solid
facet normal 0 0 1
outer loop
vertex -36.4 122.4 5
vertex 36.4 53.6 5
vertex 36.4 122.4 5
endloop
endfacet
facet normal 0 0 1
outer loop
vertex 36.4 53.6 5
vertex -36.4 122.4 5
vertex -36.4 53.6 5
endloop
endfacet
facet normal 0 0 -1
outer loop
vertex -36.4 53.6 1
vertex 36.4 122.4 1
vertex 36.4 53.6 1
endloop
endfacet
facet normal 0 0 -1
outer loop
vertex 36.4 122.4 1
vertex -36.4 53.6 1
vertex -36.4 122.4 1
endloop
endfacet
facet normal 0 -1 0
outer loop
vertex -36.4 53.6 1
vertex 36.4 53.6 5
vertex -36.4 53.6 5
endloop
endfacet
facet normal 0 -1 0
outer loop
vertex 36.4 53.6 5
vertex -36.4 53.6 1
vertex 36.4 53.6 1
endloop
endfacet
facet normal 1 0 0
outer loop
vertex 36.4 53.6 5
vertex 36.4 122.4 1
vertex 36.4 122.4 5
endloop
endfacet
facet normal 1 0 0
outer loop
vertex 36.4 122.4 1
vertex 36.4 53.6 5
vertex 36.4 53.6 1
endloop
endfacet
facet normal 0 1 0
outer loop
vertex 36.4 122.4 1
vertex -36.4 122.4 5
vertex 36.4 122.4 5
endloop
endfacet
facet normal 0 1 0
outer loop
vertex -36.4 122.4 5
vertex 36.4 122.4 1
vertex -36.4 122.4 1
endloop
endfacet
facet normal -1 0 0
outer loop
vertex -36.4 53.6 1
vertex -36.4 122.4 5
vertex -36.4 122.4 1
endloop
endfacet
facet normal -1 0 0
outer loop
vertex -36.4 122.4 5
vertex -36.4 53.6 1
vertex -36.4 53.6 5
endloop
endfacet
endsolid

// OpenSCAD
// file: ../dimensions.scad
// dimensions.scad — single source of truth for all tray geometry constants.
//
// All values in millimetres unless otherwise noted.
// Sources:
//   - CD/DVD drive envelope: SFF-8551 (5.25" half-height) and laptop slim ODD (9.5 mm)
//   - CD disc geometry: ECMA-130
//   - MiniDisc cartridge: Sony MiniDisc specification (MD)
//   - Issues weyucou/minidisc-tray#1 (3D modeling format research) and
//     weyucou/minidisc-tray#2 (CD/DVD tray dimensions)


// ---------------------------------------------------------------------------
// CD/DVD drive envelope (target form factor)
// ---------------------------------------------------------------------------

// Primary target: 5.25" half-height (SFF-8551) drive body.
DRIVE_BODY_W = 146.1;   // outer width
DRIVE_BODY_H = 41.3;    // outer height
DRIVE_BODY_D = 170;     // outer depth (typical; range 170–203)

// Slim laptop ODD (9.5 mm) — secondary parametric variant.
SLIM_BODY_W = 128;
SLIM_BODY_H = 9.5;
SLIM_BODY_D = 127;


// ---------------------------------------------------------------------------
// CD tray envelope (the cavity the printed tray must fit into)
// ---------------------------------------------------------------------------

// Inner tray usable width — the lateral envelope between the tray side walls.
// Derived in #2: ~63 mm from spindle centre to each side wall.
TRAY_INNER_W = 126;

// Spindle-centre-to-front-bezel distance.
// Range observed across donor drives: 80–95 mm.
// Default = mid-range; UPDATE after physical measurement of the actual donor drive.
SPINDLE_TO_BEZEL = 88;

// CD program area (informational — used to validate spindle clearance).
// ECMA-130: program area lies between r=25 and r=58 mm.
CD_DISC_DIA = 120;
CD_CENTER_HOLE = 15;
CD_CLAMP_R_MIN = 26;
CD_CLAMP_R_MAX = 33;

// Inner tray usable depth — derived from spindle-to-bezel + CD radius + rear margin.
// Matches typical 5.25" half-height CD tray depth. Refine when donor drive measured.
TRAY_INNER_D = SPINDLE_TO_BEZEL + CD_DISC_DIA / 2 + 10;

// Spindle clearance hole radius — clears the CD spindle hub / clamp area.
// Sized at CD_CLAMP_R_MAX + 1 mm safety; also clears the MD internal disc edge.
SPINDLE_CLEARANCE_R = CD_CLAMP_R_MAX + 1;


// ---------------------------------------------------------------------------
// MiniDisc cartridge (the part the tray must position and shutter-actuate)
// ---------------------------------------------------------------------------

// Cartridge outer dimensions — Sony MD spec.
MD_W = 72;   // width  (along shutter slide axis)
MD_D = 68;   // depth  (perpendicular to shutter slide)
MD_H = 5;    // thickness

// Internal disc — used for spindle-clearance hole sizing and centring checks.
MD_DISC_DIA = 64;
MD_CENTER_HOLE = 11;


// ---------------------------------------------------------------------------
// Print and fit tolerances
// ---------------------------------------------------------------------------

// Per-side print clearance applied to mating surfaces (tray-to-cavity, MD pocket).
// Tuned for AFINIA H400+ FDM with default Afinia Studio profile.
FIT_CLEARANCE = 0.4;

// OpenSCAD render facet count for circular features.
// Higher = smoother curves at the cost of render time.
$fn = 64;


// ---------------------------------------------------------------------------
// Tray geometry (design constants)
// ---------------------------------------------------------------------------

// Tray base plate thickness — chosen for FDM stiffness across the full footprint.
// Must exceed MD_POCKET_DEPTH so the pocket leaves a continuous floor.
TRAY_BASE_THICKNESS = 4.0;

// MD pocket recess depth — how far the cartridge sits below the tray surface.
// MD_H = 5 mm; a 3 mm recess leaves the cartridge ~2 mm proud, easy to grip.
MD_POCKET_DEPTH = 3.0;

// Shutter actuator pin geometry — engages the MD cartridge shutter tab from
// inside the pocket as the cartridge is slid into final position.
SHUTTER_PIN_DIA = 3.0;
SHUTTER_PIN_H = 6.0;

// Shutter tab engagement position, measured from the leading corner of the
// MD pocket. Approximate; refine against a physical Sony MD cartridge.
SHUTTER_TAB_X_OFFSET = 5.0;
SHUTTER_TAB_Y_OFFSET = 4.0;
// main file
// md_pocket.scad — MD cartridge recess, sized for a 72 × 68 × 5 mm Sony MD.
//
// Produces a negative volume intended to be subtracted from the tray base.
// Pocket is centred laterally on X = 0 and over the spindle on Y, so the
// cartridge sits centred over the spindle position.
//
// MD orientation in the pocket:
//   - MD_W (72 mm, shutter-slide axis) along X
//   - MD_D (68 mm)                      along Y

include <../dimensions.scad>;

module md_pocket(
    spindle_to_bezel = SPINDLE_TO_BEZEL,
    base_thickness = TRAY_BASE_THICKNESS,
    pocket_depth = MD_POCKET_DEPTH,
    clearance = FIT_CLEARANCE
) {
    pocket_w = MD_W + 2 * clearance;
    pocket_d = MD_D + 2 * clearance;
    // The cube extends 1 mm above the tray top to guarantee a clean cut
    // through the top surface when this volume is subtracted.
    translate([
        -pocket_w / 2,
        spindle_to_bezel - pocket_d / 2,
        base_thickness - pocket_depth
    ])
        cube([pocket_w, pocket_d, pocket_depth + 1]);
}

md_pocket();
